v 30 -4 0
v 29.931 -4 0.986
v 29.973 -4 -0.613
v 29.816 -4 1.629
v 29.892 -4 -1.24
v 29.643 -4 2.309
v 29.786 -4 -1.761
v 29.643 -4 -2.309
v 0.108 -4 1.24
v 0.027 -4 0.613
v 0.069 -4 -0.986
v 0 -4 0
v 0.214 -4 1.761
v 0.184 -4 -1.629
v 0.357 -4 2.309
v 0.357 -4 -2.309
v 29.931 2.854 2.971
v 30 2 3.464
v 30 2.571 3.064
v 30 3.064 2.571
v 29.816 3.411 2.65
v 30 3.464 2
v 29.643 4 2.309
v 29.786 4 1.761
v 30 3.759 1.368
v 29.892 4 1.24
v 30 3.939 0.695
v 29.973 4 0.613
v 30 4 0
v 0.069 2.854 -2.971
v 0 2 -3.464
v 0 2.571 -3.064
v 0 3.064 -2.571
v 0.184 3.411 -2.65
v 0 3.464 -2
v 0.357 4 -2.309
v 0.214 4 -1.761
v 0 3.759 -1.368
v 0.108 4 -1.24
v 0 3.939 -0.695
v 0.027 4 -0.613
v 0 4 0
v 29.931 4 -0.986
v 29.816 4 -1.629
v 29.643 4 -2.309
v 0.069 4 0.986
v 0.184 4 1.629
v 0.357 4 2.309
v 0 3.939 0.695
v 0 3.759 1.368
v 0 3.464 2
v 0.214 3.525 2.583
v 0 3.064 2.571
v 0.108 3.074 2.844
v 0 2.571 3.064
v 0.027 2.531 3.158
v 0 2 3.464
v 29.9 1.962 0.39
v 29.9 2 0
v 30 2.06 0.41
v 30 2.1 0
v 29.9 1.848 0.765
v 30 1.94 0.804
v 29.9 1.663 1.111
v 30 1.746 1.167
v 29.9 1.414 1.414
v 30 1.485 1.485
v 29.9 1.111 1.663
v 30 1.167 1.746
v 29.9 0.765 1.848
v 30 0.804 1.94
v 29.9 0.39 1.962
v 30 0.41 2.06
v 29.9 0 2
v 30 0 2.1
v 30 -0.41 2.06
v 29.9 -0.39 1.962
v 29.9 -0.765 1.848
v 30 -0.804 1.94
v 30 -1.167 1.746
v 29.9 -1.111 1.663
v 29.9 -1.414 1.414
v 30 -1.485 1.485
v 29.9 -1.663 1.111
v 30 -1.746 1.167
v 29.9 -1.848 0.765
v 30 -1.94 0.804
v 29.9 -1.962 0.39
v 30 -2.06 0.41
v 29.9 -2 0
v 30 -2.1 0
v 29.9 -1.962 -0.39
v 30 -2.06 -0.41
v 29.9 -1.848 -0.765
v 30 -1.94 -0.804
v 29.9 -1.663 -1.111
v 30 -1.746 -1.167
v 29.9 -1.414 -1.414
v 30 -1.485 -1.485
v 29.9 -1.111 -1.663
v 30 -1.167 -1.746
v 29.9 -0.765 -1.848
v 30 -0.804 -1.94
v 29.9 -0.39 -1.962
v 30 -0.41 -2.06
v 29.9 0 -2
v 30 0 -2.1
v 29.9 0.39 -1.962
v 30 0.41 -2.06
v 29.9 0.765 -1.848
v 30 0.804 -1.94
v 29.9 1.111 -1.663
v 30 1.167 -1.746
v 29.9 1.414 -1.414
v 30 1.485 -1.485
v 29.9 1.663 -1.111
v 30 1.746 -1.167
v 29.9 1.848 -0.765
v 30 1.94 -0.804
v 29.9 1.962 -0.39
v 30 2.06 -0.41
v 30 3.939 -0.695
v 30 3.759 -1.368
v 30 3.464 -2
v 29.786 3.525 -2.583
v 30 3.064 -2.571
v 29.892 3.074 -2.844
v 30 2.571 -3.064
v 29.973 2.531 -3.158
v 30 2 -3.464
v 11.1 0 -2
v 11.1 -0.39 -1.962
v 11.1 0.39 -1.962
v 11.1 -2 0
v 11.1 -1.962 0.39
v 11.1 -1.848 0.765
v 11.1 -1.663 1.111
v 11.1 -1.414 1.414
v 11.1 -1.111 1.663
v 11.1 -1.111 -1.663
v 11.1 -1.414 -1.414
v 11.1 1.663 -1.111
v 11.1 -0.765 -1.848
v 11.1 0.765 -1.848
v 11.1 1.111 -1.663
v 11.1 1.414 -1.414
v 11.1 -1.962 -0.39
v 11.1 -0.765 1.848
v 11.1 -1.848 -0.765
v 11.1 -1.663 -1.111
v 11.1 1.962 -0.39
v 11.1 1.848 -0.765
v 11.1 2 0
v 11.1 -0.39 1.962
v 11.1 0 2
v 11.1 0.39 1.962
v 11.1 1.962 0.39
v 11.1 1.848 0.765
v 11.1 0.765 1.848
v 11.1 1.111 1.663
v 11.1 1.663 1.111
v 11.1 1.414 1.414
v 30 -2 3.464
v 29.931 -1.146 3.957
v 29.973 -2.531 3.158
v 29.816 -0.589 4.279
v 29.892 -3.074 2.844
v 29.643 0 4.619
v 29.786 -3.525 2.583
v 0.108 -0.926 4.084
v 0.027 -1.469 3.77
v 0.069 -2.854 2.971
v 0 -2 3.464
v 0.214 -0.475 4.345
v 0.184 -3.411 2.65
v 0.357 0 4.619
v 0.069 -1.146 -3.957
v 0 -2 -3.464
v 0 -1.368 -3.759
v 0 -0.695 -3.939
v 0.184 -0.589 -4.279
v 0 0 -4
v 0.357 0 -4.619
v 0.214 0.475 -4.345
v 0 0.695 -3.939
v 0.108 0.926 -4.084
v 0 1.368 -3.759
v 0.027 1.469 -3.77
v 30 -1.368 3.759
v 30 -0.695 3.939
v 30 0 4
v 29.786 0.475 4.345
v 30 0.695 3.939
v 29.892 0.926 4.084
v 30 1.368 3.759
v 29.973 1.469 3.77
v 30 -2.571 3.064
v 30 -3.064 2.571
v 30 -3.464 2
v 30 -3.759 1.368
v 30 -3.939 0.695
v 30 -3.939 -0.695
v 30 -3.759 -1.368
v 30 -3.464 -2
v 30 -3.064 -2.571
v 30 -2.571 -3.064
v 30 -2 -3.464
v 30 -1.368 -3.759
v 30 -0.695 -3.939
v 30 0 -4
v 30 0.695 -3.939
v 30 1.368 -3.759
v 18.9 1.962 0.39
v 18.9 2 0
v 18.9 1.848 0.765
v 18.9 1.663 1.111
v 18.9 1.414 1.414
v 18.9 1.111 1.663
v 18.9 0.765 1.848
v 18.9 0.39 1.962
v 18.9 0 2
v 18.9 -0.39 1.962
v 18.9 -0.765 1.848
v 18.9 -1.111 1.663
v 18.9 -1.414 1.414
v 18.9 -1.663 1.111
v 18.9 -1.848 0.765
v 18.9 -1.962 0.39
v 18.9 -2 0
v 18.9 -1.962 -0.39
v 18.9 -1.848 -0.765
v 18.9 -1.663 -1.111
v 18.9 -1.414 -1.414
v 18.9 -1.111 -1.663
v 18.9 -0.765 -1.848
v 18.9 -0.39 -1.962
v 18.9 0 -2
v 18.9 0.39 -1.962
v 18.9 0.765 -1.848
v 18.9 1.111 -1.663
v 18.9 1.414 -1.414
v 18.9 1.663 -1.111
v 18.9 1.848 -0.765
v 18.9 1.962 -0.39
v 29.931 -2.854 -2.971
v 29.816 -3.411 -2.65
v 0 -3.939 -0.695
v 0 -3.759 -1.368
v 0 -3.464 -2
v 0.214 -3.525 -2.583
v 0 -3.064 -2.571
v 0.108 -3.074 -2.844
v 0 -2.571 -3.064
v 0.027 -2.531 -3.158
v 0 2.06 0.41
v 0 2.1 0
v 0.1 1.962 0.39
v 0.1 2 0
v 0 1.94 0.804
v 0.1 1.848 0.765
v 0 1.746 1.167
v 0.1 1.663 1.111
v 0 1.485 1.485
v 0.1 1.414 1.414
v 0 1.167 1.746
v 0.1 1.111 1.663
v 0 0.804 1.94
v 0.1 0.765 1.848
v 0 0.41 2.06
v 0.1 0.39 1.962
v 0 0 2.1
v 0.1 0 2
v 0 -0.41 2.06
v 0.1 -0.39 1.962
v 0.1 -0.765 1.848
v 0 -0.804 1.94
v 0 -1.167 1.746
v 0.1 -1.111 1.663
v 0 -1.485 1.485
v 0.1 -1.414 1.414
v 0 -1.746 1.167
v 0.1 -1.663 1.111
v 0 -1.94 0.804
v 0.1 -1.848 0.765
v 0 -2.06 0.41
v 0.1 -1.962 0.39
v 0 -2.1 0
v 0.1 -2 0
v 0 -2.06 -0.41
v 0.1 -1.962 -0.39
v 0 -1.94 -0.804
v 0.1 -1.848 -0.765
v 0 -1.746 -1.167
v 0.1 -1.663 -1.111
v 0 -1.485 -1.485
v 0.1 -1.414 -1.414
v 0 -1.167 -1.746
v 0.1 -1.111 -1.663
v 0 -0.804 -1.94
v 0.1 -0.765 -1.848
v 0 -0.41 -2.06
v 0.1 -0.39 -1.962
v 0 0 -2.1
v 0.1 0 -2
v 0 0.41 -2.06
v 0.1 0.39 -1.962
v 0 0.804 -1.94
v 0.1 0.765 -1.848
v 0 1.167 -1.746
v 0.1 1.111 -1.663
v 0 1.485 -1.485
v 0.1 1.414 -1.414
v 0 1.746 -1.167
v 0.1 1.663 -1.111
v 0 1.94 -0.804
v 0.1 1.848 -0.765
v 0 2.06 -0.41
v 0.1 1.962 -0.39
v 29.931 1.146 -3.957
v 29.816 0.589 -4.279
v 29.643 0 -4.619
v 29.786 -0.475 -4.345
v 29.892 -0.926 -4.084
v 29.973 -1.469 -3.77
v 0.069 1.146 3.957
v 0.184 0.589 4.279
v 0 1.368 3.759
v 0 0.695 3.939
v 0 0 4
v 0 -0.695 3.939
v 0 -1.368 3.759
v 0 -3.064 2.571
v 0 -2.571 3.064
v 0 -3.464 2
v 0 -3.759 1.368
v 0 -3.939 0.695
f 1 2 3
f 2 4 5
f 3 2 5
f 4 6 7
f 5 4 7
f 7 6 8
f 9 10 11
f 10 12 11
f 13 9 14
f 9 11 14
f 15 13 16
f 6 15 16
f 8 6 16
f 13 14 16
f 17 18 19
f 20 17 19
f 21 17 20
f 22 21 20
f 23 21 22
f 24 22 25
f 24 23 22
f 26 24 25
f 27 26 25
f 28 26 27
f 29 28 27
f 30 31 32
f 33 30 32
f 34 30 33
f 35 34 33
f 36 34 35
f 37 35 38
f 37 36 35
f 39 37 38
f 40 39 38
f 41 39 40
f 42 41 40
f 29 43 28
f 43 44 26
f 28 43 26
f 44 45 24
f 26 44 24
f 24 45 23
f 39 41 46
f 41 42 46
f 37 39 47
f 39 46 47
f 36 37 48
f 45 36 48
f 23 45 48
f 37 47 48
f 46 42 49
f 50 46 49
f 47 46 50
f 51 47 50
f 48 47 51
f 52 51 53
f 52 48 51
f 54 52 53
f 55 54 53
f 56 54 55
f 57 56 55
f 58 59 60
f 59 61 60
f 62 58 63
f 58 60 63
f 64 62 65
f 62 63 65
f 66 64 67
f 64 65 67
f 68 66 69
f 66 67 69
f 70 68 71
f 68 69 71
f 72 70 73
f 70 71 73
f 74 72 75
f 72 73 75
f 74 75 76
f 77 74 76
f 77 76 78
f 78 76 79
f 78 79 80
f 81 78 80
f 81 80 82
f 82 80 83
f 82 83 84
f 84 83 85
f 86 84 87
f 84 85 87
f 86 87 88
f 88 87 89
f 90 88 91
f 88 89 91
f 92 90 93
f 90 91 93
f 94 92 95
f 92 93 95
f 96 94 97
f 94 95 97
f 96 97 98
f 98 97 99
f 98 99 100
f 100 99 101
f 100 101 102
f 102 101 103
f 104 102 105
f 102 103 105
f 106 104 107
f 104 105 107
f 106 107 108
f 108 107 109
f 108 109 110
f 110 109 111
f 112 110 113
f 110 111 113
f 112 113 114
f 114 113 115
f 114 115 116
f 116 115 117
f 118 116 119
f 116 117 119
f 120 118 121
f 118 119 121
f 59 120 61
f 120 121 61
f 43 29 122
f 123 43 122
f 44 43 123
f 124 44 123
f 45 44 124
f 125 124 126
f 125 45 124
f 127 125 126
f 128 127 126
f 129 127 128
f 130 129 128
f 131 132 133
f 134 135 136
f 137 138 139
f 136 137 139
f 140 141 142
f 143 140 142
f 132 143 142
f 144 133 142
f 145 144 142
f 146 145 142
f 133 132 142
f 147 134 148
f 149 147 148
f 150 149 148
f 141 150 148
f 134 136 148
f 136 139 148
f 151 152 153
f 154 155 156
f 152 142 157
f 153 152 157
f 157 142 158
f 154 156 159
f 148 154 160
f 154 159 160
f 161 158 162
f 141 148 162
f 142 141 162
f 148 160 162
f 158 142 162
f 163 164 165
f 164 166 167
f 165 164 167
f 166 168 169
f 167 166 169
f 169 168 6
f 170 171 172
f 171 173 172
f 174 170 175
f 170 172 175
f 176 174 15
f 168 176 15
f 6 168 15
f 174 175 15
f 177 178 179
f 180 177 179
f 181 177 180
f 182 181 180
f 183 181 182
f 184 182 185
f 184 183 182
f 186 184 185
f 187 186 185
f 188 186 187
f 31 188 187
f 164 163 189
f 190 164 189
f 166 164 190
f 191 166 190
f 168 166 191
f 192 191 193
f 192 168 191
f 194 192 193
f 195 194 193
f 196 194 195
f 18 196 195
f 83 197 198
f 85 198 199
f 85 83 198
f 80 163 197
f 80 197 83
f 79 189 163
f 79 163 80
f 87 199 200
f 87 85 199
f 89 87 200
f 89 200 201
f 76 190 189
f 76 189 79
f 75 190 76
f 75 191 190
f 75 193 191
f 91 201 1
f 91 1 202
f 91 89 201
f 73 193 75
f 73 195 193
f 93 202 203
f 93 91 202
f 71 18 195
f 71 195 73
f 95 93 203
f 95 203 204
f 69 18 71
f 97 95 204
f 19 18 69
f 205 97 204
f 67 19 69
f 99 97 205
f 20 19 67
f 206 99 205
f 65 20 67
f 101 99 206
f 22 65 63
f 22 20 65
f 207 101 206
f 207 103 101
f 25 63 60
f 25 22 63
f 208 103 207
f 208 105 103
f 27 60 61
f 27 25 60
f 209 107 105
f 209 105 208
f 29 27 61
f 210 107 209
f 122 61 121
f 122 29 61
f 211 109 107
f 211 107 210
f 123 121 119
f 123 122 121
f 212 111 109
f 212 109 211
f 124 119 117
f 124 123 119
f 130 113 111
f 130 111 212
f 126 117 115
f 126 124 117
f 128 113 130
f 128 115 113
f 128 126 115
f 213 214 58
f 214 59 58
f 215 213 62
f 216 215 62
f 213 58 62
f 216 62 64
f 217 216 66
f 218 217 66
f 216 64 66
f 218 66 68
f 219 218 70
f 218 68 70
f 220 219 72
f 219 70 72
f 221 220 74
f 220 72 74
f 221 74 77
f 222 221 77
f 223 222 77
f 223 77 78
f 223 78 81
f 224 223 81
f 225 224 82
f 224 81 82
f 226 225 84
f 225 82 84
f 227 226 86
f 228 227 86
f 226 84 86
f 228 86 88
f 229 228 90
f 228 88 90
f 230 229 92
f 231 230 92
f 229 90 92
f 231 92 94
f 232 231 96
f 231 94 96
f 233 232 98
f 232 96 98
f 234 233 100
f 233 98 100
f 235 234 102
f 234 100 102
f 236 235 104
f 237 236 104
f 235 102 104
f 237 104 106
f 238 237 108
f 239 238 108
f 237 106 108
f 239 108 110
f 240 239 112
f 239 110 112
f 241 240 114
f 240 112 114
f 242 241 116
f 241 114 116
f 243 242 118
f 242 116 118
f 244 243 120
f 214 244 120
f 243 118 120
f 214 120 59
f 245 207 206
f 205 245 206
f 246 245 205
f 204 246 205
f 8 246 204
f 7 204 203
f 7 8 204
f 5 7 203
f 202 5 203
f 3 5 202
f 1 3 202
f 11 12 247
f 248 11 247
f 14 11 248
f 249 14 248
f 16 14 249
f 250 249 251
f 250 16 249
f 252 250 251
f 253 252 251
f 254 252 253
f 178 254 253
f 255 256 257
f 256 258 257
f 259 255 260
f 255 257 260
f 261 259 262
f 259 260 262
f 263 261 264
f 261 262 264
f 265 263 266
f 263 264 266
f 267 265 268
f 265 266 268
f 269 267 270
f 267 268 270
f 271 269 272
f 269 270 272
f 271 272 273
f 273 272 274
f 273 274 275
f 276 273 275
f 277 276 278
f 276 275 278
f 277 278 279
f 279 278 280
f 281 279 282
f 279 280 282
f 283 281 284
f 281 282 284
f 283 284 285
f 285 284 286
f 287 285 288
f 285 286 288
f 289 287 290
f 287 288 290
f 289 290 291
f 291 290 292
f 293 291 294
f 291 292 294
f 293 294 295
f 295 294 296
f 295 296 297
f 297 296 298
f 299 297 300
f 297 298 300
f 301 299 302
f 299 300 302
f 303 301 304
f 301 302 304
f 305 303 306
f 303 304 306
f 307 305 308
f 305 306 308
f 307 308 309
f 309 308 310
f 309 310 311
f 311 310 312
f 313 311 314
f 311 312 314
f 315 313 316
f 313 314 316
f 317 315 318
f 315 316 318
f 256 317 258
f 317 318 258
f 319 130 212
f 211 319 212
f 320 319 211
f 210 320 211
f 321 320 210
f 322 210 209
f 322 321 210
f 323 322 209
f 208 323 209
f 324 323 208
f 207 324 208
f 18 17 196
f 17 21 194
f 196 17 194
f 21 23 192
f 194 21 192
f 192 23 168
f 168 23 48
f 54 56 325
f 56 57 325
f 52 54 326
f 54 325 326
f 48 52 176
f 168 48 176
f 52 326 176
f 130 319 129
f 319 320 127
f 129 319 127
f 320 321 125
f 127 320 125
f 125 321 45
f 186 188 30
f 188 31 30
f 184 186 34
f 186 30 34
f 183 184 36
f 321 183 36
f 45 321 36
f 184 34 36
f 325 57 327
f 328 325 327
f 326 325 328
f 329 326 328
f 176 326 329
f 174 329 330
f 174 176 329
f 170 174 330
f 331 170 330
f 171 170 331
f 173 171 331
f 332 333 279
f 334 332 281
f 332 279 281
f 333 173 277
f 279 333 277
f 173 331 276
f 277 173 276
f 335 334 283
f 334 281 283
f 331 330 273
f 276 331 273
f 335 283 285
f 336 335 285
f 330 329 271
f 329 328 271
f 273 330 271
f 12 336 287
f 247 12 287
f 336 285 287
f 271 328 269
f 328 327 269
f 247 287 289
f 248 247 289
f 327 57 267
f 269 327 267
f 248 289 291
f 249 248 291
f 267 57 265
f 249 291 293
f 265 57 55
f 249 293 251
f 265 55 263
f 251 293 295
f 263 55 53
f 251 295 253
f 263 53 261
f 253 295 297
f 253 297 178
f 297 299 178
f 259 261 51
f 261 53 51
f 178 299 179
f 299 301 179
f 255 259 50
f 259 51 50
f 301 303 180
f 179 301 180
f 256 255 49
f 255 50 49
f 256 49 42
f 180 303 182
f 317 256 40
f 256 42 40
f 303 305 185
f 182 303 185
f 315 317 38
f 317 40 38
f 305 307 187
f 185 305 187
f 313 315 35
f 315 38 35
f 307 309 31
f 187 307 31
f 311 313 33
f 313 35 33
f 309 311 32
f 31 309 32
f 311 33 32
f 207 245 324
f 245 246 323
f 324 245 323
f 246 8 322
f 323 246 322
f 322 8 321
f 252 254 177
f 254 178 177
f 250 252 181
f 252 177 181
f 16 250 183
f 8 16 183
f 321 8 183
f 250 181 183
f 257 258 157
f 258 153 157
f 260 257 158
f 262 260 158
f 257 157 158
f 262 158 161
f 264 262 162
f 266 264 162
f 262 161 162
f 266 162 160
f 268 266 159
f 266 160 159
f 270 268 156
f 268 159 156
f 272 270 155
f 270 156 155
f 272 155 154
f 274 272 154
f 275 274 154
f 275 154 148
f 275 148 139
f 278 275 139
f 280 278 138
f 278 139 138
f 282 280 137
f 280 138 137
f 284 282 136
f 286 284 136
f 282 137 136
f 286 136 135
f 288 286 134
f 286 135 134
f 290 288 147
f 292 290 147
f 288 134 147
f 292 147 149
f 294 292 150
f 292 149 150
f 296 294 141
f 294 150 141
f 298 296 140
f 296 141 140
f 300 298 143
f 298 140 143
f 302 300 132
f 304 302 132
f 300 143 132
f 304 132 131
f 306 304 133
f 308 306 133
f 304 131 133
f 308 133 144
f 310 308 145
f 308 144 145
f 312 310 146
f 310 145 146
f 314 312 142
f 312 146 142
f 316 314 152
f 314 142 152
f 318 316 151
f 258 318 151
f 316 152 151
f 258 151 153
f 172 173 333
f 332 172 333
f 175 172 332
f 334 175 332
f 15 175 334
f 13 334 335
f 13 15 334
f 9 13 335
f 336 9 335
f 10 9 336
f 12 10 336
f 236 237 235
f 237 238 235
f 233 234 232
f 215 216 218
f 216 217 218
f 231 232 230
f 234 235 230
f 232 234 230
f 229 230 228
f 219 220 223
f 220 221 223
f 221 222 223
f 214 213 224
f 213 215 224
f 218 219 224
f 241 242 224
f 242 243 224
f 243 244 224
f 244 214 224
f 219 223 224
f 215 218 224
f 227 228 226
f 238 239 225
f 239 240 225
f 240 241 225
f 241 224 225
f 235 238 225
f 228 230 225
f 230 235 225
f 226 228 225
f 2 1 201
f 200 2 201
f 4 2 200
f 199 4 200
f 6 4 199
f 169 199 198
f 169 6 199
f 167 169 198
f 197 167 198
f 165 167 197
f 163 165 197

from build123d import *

# Parameters (mm, degrees)
BOSS_EXTRUDE1_DEPTH = 30
SKETCH4_OUTSIDE_W   = 125.104
SKETCH4_OUTSIDE_H   = 123.866
SKETCH4_OUTSIDE_R   = 4
CUT_EXTRUDE1_DEPTH  = 31
CUT_EXTRUDE1_TAPER  = 60
SKETCH5_OUTSIDE_W   = 125.104
SKETCH5_OUTSIDE_H   = 123.866
SKETCH5_OUTSIDE_R   = 4
CUT_EXTRUDE2_DEPTH  = 31
CUT_EXTRUDE2_TAPER  = 60


with BuildPart() as part:
    # Sketch2 → Boss-Extrude1 (new body)
    with BuildSketch(Plane(origin=(0, 0, 0), x_dir=(0, 0, -1), z_dir=(1, 0, 0))):
        Polygon((2.309401077, 4), (-2.309401077, 4), (-4.618802154, 0), (-2.309401077, -4), (2.309401077, -4), (4.618802154, 0), align=None)
    extrude(amount=BOSS_EXTRUDE1_DEPTH)

    # Sketch3 → Cut-Revolve1 (revolve, cut)
    with BuildSketch(Plane.XY):
        Polygon((0, 2.1), (0.1, 2), (11.1, 2), (11.1, 0), (0, 0), align=None)
        Polygon((30, 0), (18.9, 0), (18.9, 2), (29.9, 2), (30, 2.1), align=None)
    revolve(axis=Axis((0, 0, 0), (1, 0, 0)), mode=Mode.SUBTRACT)

    # Sketch4 outside → Cut-Extrude1 (cut, through all)
    with BuildSketch(Plane.ZY):
        Rectangle(SKETCH4_OUTSIDE_W, SKETCH4_OUTSIDE_H)
        Circle(SKETCH4_OUTSIDE_R, mode=Mode.SUBTRACT)
    extrude(amount=-CUT_EXTRUDE1_DEPTH, taper=CUT_EXTRUDE1_TAPER, mode=Mode.SUBTRACT)

    # Sketch5 outside → Cut-Extrude2 (cut, through all)
    with BuildSketch(Plane(origin=(30, 0, 0), x_dir=(0, 0, -1), z_dir=(1, 0, 0))):
        Rectangle(SKETCH5_OUTSIDE_W, SKETCH5_OUTSIDE_H)
        Circle(SKETCH5_OUTSIDE_R, mode=Mode.SUBTRACT)
    extrude(amount=-CUT_EXTRUDE2_DEPTH, taper=CUT_EXTRUDE2_TAPER, mode=Mode.SUBTRACT)


solid = part.part
